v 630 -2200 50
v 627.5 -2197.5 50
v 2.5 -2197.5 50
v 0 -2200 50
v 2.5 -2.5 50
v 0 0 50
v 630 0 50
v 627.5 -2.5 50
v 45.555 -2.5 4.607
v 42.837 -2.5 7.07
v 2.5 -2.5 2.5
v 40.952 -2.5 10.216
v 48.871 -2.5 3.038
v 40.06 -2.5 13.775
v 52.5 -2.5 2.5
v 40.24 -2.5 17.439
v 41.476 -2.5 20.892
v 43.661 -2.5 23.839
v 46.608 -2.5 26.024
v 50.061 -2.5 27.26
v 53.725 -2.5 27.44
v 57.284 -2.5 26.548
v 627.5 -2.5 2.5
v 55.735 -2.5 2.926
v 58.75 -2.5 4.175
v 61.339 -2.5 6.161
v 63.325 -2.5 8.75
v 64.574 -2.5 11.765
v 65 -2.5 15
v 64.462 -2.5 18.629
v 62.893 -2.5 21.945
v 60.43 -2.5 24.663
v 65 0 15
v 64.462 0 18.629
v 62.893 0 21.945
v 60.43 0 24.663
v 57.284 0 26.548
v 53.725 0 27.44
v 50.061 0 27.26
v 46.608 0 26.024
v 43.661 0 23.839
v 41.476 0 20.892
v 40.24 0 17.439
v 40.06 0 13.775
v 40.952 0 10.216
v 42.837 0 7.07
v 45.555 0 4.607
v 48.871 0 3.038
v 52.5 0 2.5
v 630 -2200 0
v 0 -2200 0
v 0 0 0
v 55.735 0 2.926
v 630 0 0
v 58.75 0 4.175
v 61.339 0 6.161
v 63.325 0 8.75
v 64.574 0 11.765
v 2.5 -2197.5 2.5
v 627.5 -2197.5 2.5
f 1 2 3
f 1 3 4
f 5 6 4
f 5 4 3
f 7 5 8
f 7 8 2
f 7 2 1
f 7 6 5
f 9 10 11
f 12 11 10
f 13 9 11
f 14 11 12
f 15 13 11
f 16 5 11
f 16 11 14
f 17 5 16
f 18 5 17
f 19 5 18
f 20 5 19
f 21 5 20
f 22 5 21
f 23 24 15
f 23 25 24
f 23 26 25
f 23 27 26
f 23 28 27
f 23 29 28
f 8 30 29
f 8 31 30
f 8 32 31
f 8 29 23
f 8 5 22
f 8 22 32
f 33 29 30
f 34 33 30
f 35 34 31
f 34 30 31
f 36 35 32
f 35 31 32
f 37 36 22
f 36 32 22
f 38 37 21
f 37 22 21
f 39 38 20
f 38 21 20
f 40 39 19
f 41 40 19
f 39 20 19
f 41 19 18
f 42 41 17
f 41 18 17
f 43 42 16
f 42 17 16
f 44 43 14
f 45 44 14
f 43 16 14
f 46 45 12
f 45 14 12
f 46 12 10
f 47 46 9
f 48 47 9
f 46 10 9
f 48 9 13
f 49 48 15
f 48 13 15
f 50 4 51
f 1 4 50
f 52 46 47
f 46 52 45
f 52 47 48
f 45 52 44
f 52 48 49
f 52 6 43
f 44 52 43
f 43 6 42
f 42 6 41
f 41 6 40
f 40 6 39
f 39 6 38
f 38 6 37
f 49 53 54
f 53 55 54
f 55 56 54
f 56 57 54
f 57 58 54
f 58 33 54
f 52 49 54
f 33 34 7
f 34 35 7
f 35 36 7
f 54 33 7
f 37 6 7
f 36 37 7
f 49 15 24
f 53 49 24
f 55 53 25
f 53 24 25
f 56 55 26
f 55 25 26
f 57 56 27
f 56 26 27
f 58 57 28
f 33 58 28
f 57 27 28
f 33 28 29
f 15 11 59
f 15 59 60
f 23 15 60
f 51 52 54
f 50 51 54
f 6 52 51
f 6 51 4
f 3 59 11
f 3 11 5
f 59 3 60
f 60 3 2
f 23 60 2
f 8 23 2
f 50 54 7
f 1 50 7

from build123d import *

# Parameters (mm, degrees)
F0_W     = 630
F0_H     = 50
F1_DEPTH = 2200
F2_T     = -2.5
F4_DEPTH = 30


with BuildPart() as f1:
    # F0 (on Front) → F1 (new body)
    with BuildSketch(Plane.XZ):
        with Locations((315, 25)):
            Rectangle(F0_W, F0_H)
    extrude(amount=F1_DEPTH)

    # F2
    f2_openings = [f1.faces().sort_by_distance(p)[0] for p in [
        (315, -1100, 50),
    ]]
    offset(amount=F2_T, openings=f2_openings)

    # F3 (on face) → F4 (cut)
    with BuildSketch(Plane.XZ.offset(2.5)):
        with BuildLine():
            ThreePointArc((52.5, 2.5), (61.338835, 6.161165), (65, 15))
            ThreePointArc((65, 15), (43.661165, 23.838835), (52.5, 2.5))
        make_face()
    extrude(amount=-F4_DEPTH, mode=Mode.SUBTRACT)


solid = f1.part
